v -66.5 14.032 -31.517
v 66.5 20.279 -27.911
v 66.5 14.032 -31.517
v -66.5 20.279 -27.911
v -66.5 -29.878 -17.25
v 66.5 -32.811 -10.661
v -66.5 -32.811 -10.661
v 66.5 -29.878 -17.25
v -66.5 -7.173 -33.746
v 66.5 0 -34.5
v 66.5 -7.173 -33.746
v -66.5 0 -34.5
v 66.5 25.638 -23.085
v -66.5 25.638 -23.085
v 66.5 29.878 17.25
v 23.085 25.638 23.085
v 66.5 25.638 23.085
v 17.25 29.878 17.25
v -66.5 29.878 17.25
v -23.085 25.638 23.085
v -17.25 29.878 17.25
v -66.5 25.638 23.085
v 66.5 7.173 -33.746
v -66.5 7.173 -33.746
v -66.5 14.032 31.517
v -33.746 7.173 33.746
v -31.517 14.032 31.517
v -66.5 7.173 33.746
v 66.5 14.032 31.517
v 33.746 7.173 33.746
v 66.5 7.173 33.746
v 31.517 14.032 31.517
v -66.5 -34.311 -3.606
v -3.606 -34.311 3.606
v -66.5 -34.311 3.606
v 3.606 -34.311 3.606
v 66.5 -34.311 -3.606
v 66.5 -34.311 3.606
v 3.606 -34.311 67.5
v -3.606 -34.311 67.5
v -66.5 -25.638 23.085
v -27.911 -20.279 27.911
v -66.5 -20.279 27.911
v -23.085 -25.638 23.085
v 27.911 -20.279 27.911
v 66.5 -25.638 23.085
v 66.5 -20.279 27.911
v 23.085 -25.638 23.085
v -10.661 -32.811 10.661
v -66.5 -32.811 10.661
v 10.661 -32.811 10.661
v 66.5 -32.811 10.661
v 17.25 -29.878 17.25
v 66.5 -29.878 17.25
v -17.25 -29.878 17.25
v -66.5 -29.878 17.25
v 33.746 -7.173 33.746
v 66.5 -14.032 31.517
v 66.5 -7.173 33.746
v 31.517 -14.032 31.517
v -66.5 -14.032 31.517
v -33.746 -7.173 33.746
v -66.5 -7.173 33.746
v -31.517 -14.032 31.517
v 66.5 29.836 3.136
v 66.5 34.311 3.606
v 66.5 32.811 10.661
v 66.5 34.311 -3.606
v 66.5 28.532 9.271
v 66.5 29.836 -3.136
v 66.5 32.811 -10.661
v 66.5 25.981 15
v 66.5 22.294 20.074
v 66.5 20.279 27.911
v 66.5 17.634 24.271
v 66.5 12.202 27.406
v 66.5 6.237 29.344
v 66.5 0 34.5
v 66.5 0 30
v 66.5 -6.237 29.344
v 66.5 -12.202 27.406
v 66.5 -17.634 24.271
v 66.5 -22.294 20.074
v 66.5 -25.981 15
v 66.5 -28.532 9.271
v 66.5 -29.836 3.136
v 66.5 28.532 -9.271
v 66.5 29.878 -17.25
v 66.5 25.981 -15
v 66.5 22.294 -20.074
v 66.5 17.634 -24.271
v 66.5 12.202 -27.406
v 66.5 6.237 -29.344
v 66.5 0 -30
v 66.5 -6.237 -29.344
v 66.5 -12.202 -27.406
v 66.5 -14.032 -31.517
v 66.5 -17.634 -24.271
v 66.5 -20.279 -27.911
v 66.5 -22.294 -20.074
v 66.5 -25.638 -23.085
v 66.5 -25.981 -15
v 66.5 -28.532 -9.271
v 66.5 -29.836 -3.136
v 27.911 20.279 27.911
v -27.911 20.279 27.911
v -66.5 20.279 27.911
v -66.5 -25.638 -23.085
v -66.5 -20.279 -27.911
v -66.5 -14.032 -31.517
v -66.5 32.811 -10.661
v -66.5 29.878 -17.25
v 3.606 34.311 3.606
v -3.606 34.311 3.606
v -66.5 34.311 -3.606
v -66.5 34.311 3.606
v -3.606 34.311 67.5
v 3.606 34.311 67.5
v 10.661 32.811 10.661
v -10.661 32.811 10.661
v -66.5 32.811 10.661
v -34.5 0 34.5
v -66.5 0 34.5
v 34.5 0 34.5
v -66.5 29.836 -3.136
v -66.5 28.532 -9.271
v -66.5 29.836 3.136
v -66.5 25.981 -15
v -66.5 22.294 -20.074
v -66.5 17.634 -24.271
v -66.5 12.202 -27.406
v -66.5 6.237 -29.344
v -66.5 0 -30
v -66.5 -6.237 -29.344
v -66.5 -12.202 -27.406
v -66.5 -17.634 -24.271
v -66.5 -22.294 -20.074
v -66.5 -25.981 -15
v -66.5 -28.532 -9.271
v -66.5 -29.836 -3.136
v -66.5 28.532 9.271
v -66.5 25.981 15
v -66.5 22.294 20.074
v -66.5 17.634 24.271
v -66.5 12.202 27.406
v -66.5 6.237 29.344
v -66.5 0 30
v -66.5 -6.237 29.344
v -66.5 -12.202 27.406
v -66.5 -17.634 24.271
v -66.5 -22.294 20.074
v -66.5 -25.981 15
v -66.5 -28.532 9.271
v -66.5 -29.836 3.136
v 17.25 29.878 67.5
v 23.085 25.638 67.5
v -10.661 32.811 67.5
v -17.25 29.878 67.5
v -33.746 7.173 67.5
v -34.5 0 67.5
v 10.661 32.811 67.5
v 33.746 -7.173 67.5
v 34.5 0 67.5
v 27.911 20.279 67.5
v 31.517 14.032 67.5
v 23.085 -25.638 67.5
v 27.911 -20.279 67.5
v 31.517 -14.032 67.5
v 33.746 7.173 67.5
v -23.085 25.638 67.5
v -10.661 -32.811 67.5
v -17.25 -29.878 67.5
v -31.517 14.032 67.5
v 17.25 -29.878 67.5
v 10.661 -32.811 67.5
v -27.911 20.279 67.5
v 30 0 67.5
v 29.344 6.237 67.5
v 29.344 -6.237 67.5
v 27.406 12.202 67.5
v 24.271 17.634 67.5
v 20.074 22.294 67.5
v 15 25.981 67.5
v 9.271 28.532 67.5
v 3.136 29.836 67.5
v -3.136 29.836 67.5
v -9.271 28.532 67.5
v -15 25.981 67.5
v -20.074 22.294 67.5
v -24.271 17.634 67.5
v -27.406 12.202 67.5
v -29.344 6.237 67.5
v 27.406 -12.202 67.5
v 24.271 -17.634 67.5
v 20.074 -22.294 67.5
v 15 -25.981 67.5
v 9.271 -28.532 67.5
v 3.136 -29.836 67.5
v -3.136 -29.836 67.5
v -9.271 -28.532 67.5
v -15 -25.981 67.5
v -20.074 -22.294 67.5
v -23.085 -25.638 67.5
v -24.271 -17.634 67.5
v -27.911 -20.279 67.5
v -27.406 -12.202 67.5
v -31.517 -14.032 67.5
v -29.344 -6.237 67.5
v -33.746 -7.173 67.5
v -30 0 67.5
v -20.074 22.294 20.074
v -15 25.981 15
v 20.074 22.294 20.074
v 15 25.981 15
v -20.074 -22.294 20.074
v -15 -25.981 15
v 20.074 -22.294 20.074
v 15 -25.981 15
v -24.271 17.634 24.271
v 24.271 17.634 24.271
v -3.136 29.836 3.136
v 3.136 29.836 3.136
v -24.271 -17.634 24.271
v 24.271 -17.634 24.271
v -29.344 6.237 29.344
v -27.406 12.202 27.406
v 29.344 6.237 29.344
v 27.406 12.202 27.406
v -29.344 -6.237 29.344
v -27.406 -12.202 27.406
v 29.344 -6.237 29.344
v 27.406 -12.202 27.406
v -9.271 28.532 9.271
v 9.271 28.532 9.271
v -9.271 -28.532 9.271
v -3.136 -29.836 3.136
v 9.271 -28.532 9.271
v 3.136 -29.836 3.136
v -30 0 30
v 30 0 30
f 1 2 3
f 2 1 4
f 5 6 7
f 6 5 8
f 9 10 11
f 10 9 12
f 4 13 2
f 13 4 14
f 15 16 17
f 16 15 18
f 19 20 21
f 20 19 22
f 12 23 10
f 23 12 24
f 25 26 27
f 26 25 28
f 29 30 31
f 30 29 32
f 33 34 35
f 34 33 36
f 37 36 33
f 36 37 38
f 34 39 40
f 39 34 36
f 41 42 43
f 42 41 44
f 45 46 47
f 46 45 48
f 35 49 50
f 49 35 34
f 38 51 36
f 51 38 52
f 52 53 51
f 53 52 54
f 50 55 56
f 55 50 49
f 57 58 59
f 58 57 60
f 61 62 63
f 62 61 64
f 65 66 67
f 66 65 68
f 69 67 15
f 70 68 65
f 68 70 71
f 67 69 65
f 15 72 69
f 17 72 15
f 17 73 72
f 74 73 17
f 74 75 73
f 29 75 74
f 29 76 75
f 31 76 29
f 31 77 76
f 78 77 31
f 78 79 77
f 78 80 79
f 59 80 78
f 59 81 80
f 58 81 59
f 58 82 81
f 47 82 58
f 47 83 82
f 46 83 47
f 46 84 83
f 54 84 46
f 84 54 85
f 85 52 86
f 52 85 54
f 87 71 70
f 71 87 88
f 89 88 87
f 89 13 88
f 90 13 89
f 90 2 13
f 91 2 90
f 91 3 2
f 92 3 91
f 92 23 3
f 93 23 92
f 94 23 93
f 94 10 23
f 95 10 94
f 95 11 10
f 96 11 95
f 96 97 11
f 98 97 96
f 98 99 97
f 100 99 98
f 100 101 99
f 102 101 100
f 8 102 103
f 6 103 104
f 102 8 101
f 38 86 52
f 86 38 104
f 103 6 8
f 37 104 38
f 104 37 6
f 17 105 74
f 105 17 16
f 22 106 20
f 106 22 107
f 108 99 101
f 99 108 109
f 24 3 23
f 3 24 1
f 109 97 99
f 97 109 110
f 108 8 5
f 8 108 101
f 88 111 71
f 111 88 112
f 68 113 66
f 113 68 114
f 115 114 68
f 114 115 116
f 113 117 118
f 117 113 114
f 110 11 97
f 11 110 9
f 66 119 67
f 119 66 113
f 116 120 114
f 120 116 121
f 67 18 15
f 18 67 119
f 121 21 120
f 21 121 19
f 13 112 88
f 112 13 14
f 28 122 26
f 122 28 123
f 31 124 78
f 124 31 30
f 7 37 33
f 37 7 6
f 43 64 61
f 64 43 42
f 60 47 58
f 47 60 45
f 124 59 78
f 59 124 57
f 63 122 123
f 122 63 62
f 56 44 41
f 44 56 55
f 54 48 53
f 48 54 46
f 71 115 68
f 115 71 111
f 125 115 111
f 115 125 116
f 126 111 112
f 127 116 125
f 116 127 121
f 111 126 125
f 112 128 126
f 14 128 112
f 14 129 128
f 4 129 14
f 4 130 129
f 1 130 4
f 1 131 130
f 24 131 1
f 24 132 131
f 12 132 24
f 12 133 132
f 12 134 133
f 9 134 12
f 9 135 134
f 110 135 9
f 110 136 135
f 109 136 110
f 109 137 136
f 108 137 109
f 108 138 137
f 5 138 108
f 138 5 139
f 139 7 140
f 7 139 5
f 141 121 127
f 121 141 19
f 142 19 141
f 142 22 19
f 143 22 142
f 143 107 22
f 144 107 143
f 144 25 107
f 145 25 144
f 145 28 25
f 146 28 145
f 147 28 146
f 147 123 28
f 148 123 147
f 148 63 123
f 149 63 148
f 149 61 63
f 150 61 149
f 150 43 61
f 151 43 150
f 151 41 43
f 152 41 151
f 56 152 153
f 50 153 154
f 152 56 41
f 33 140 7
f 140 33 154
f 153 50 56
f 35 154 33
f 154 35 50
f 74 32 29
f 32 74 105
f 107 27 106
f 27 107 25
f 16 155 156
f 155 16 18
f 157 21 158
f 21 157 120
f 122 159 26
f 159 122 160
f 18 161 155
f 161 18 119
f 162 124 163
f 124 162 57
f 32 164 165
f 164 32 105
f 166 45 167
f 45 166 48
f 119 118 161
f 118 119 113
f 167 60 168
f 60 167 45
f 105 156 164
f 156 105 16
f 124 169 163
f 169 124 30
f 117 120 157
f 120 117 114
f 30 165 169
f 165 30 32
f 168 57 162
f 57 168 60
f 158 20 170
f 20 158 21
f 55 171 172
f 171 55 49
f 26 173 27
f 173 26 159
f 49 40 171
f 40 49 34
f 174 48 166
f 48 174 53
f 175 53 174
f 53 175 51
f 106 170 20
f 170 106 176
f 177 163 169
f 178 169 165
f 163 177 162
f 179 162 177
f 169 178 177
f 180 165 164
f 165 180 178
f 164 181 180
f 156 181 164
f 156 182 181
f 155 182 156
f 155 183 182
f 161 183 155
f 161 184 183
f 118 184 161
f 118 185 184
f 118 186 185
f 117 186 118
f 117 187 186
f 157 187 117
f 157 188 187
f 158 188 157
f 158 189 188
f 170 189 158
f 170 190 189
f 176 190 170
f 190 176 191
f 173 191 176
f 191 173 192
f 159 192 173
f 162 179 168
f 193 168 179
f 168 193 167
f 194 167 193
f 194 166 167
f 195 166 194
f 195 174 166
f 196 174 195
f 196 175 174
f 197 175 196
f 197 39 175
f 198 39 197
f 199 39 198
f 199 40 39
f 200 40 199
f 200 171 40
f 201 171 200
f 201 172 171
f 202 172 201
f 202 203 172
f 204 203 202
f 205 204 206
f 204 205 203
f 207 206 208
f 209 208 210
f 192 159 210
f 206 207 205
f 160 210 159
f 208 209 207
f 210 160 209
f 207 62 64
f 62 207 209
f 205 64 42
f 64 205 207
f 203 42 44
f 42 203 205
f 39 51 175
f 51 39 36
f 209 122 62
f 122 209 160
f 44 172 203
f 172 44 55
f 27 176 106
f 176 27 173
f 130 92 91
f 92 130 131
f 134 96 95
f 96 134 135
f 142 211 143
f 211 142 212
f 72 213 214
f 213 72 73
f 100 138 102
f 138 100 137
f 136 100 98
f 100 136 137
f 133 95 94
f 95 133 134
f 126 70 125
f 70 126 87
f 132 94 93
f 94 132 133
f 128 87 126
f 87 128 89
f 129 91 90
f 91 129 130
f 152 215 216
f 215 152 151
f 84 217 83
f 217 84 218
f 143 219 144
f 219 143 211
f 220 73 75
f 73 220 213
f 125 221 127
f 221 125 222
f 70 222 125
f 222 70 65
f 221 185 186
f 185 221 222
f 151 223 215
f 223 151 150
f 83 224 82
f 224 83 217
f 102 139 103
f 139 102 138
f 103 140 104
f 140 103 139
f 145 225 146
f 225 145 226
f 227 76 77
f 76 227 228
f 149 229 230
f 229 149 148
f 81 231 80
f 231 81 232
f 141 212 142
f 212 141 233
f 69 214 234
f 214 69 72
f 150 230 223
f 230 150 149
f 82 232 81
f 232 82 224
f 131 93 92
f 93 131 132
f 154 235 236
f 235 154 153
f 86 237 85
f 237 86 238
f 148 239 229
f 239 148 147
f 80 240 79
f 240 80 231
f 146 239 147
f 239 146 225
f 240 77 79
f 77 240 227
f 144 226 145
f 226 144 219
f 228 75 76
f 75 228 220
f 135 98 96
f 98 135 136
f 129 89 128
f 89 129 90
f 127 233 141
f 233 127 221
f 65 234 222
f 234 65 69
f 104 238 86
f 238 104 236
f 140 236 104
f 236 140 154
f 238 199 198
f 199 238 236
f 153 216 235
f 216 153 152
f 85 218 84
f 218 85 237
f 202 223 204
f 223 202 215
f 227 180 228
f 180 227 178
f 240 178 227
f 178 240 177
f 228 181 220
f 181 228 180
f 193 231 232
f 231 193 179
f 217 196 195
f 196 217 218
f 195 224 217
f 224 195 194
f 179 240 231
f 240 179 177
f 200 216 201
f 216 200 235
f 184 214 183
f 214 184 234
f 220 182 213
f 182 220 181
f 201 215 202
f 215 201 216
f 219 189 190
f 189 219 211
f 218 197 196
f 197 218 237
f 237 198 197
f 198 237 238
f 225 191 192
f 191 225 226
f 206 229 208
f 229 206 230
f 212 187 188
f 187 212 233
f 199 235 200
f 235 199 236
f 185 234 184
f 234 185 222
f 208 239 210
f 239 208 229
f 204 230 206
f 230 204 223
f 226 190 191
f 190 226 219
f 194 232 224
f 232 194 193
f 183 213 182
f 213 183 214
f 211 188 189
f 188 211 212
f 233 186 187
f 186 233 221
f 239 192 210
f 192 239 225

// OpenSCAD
// -*-C-*-
// Limit switch mounts for Fireball v90.
//
// Copyright 2013, Brian Davis
//
// License: LGPL 2.1 or later

//$fn=0;
//$fa=0.01;
//$fs=0.9;

module 2_inch_pvc_pipe(length=100) {
  difference() {
    // OD (outer diameter)
    cylinder(r=30.0, h=length, center=true);
    // ID (inner diameter)
    cylinder(r=52.3/2.0, h=(length + 1.0), center=true);
  }
}

module 2_inch_pvc_connector() {
  difference() {
    cylinder(r=35.0, h=22.0, center=true);
    cylinder(r=30.0, h=23.0, center=true);
  }
}

CXP2_OFFSET = 68;

module 2_inch_pvc_elbow_home_depot() {
  translate([-30, 0, -38])
  union() {
    2_inch_pvc_connector();
    translate([CXP2_OFFSET, 0, CXP2_OFFSET])
      rotate([0, 90, 0])
        2_inch_pvc_connector();
    difference() {
      // Body.
      translate([68, 0, 0])
        rotate([90, 0, 0])
          rotate_extrude(convexity=10)
            translate([68, 0, 0])
              circle(r=61.0/2.0);
      union() {
        // Body.
        translate([68, 0, 0])
          rotate([90, 0, 0])
            rotate_extrude(convexity=10)
              translate([68, 0, 0])
                circle(r=28.0);
        translate([112, 0, 0])
          cube([110, 100, 220], center=true);
        translate([10, 0, -49])
          cube([100, 100, 120], center=true);
      }
    }
  }
}

TEE_OFFSET = 48.0;

module 2_inch_pvc_test_tee() {
  for (x_mult = [-1 : 2 : 1]) {
    translate([x_mult * TEE_OFFSET, 0, 0])
      rotate([0, 90, 0])
        2_inch_pvc_connector();
  }
  translate([0, 0, TEE_OFFSET])
    2_inch_pvc_connector();
  translate([0, 0, 21])
    2_inch_pvc_pipe(length=33.0);
  rotate([0, 90, 0])
    2_inch_pvc_pipe(length=75.0);
}

module 2_inch_pvc_test_tee_adapter() {
  difference() {
    cylinder(r=35.0, h=28.0, center=true);
    cylinder(r=30.0, h=29, center=true);
  }
}

module 2_inch_test_tee_adapted() {
  2_inch_pvc_test_tee();
  translate([0, 0, 73.25])
    2_inch_pvc_test_tee_adapter();
}

LASCO_OD = 69;
LASCO_ID = 60;

LASCO_ELBOW_OFFSET = (LASCO_OD / 2) + (32 / 2);

module 2_inch_lasco_pvc_section(l=10) {
  difference() {
    cylinder(r=LASCO_OD/2, h=l, center=true);
    cylinder(r=LASCO_ID/2, h=l + 0.2, center=true);
  }
}

// Modelled from Lasco schedule 40 elbow.
module 2_inch_pvc_elbow() {
  translate([-18, 0, -35])
  union() {
    translate([57, 0, 50])
      rotate([0, 90, 0])
        2_inch_lasco_pvc_section(l=21);
    translate([1, 0, -5])
      2_inch_lasco_pvc_section(l=21);
    difference() {
      // Body.
      translate([LASCO_ELBOW_OFFSET, 0, 0])
        rotate([90, 0, 0])
          rotate_extrude(convexity=10)
            translate([LASCO_ELBOW_OFFSET, 0, 0])
              circle(r=LASCO_OD/2);
      union() {
        // Body.
        translate([LASCO_ELBOW_OFFSET, 0, 0])
          rotate([90, 0, 0])
            rotate_extrude(convexity=10)
              translate([LASCO_ELBOW_OFFSET, 0, 0])
                circle(r=LASCO_ID/2);
        translate([105, 0, 0])
          cube([110, 100, 220], center=true);
        translate([10, 0, -55.5])
          cube([100, 100, 120], center=true);
      }
    }
  }
}

// Modelled from Lasco schedule 40 tee.
module 2_inch_pvc_tee() {
  difference() {
    union() {
      rotate([0, 90, 0])
        cylinder(r=LASCO_OD/2, h=133, center=true);
      translate([0, 0, 35])
        cylinder(r=LASCO_OD/2, h=65, center=true);
    }
    union() {
      rotate([0, 90, 0])
        cylinder(r=LASCO_ID/2, h=134, center=true);
      translate([0, 0, 35])
        cylinder(r=LASCO_ID/2, h=66, center=true);
    }
  }
}

*2_inch_pvc_pipe();

*2_inch_pvc_elbow();

*union() {
  2_inch_pvc_test_tee();

  translate([0, 0, 73.25])
    2_inch_pvc_test_tee_adapter();
}

*2_inch_test_tee_adapted();

2_inch_pvc_tee();

*2_inch_pvc_elbow();
